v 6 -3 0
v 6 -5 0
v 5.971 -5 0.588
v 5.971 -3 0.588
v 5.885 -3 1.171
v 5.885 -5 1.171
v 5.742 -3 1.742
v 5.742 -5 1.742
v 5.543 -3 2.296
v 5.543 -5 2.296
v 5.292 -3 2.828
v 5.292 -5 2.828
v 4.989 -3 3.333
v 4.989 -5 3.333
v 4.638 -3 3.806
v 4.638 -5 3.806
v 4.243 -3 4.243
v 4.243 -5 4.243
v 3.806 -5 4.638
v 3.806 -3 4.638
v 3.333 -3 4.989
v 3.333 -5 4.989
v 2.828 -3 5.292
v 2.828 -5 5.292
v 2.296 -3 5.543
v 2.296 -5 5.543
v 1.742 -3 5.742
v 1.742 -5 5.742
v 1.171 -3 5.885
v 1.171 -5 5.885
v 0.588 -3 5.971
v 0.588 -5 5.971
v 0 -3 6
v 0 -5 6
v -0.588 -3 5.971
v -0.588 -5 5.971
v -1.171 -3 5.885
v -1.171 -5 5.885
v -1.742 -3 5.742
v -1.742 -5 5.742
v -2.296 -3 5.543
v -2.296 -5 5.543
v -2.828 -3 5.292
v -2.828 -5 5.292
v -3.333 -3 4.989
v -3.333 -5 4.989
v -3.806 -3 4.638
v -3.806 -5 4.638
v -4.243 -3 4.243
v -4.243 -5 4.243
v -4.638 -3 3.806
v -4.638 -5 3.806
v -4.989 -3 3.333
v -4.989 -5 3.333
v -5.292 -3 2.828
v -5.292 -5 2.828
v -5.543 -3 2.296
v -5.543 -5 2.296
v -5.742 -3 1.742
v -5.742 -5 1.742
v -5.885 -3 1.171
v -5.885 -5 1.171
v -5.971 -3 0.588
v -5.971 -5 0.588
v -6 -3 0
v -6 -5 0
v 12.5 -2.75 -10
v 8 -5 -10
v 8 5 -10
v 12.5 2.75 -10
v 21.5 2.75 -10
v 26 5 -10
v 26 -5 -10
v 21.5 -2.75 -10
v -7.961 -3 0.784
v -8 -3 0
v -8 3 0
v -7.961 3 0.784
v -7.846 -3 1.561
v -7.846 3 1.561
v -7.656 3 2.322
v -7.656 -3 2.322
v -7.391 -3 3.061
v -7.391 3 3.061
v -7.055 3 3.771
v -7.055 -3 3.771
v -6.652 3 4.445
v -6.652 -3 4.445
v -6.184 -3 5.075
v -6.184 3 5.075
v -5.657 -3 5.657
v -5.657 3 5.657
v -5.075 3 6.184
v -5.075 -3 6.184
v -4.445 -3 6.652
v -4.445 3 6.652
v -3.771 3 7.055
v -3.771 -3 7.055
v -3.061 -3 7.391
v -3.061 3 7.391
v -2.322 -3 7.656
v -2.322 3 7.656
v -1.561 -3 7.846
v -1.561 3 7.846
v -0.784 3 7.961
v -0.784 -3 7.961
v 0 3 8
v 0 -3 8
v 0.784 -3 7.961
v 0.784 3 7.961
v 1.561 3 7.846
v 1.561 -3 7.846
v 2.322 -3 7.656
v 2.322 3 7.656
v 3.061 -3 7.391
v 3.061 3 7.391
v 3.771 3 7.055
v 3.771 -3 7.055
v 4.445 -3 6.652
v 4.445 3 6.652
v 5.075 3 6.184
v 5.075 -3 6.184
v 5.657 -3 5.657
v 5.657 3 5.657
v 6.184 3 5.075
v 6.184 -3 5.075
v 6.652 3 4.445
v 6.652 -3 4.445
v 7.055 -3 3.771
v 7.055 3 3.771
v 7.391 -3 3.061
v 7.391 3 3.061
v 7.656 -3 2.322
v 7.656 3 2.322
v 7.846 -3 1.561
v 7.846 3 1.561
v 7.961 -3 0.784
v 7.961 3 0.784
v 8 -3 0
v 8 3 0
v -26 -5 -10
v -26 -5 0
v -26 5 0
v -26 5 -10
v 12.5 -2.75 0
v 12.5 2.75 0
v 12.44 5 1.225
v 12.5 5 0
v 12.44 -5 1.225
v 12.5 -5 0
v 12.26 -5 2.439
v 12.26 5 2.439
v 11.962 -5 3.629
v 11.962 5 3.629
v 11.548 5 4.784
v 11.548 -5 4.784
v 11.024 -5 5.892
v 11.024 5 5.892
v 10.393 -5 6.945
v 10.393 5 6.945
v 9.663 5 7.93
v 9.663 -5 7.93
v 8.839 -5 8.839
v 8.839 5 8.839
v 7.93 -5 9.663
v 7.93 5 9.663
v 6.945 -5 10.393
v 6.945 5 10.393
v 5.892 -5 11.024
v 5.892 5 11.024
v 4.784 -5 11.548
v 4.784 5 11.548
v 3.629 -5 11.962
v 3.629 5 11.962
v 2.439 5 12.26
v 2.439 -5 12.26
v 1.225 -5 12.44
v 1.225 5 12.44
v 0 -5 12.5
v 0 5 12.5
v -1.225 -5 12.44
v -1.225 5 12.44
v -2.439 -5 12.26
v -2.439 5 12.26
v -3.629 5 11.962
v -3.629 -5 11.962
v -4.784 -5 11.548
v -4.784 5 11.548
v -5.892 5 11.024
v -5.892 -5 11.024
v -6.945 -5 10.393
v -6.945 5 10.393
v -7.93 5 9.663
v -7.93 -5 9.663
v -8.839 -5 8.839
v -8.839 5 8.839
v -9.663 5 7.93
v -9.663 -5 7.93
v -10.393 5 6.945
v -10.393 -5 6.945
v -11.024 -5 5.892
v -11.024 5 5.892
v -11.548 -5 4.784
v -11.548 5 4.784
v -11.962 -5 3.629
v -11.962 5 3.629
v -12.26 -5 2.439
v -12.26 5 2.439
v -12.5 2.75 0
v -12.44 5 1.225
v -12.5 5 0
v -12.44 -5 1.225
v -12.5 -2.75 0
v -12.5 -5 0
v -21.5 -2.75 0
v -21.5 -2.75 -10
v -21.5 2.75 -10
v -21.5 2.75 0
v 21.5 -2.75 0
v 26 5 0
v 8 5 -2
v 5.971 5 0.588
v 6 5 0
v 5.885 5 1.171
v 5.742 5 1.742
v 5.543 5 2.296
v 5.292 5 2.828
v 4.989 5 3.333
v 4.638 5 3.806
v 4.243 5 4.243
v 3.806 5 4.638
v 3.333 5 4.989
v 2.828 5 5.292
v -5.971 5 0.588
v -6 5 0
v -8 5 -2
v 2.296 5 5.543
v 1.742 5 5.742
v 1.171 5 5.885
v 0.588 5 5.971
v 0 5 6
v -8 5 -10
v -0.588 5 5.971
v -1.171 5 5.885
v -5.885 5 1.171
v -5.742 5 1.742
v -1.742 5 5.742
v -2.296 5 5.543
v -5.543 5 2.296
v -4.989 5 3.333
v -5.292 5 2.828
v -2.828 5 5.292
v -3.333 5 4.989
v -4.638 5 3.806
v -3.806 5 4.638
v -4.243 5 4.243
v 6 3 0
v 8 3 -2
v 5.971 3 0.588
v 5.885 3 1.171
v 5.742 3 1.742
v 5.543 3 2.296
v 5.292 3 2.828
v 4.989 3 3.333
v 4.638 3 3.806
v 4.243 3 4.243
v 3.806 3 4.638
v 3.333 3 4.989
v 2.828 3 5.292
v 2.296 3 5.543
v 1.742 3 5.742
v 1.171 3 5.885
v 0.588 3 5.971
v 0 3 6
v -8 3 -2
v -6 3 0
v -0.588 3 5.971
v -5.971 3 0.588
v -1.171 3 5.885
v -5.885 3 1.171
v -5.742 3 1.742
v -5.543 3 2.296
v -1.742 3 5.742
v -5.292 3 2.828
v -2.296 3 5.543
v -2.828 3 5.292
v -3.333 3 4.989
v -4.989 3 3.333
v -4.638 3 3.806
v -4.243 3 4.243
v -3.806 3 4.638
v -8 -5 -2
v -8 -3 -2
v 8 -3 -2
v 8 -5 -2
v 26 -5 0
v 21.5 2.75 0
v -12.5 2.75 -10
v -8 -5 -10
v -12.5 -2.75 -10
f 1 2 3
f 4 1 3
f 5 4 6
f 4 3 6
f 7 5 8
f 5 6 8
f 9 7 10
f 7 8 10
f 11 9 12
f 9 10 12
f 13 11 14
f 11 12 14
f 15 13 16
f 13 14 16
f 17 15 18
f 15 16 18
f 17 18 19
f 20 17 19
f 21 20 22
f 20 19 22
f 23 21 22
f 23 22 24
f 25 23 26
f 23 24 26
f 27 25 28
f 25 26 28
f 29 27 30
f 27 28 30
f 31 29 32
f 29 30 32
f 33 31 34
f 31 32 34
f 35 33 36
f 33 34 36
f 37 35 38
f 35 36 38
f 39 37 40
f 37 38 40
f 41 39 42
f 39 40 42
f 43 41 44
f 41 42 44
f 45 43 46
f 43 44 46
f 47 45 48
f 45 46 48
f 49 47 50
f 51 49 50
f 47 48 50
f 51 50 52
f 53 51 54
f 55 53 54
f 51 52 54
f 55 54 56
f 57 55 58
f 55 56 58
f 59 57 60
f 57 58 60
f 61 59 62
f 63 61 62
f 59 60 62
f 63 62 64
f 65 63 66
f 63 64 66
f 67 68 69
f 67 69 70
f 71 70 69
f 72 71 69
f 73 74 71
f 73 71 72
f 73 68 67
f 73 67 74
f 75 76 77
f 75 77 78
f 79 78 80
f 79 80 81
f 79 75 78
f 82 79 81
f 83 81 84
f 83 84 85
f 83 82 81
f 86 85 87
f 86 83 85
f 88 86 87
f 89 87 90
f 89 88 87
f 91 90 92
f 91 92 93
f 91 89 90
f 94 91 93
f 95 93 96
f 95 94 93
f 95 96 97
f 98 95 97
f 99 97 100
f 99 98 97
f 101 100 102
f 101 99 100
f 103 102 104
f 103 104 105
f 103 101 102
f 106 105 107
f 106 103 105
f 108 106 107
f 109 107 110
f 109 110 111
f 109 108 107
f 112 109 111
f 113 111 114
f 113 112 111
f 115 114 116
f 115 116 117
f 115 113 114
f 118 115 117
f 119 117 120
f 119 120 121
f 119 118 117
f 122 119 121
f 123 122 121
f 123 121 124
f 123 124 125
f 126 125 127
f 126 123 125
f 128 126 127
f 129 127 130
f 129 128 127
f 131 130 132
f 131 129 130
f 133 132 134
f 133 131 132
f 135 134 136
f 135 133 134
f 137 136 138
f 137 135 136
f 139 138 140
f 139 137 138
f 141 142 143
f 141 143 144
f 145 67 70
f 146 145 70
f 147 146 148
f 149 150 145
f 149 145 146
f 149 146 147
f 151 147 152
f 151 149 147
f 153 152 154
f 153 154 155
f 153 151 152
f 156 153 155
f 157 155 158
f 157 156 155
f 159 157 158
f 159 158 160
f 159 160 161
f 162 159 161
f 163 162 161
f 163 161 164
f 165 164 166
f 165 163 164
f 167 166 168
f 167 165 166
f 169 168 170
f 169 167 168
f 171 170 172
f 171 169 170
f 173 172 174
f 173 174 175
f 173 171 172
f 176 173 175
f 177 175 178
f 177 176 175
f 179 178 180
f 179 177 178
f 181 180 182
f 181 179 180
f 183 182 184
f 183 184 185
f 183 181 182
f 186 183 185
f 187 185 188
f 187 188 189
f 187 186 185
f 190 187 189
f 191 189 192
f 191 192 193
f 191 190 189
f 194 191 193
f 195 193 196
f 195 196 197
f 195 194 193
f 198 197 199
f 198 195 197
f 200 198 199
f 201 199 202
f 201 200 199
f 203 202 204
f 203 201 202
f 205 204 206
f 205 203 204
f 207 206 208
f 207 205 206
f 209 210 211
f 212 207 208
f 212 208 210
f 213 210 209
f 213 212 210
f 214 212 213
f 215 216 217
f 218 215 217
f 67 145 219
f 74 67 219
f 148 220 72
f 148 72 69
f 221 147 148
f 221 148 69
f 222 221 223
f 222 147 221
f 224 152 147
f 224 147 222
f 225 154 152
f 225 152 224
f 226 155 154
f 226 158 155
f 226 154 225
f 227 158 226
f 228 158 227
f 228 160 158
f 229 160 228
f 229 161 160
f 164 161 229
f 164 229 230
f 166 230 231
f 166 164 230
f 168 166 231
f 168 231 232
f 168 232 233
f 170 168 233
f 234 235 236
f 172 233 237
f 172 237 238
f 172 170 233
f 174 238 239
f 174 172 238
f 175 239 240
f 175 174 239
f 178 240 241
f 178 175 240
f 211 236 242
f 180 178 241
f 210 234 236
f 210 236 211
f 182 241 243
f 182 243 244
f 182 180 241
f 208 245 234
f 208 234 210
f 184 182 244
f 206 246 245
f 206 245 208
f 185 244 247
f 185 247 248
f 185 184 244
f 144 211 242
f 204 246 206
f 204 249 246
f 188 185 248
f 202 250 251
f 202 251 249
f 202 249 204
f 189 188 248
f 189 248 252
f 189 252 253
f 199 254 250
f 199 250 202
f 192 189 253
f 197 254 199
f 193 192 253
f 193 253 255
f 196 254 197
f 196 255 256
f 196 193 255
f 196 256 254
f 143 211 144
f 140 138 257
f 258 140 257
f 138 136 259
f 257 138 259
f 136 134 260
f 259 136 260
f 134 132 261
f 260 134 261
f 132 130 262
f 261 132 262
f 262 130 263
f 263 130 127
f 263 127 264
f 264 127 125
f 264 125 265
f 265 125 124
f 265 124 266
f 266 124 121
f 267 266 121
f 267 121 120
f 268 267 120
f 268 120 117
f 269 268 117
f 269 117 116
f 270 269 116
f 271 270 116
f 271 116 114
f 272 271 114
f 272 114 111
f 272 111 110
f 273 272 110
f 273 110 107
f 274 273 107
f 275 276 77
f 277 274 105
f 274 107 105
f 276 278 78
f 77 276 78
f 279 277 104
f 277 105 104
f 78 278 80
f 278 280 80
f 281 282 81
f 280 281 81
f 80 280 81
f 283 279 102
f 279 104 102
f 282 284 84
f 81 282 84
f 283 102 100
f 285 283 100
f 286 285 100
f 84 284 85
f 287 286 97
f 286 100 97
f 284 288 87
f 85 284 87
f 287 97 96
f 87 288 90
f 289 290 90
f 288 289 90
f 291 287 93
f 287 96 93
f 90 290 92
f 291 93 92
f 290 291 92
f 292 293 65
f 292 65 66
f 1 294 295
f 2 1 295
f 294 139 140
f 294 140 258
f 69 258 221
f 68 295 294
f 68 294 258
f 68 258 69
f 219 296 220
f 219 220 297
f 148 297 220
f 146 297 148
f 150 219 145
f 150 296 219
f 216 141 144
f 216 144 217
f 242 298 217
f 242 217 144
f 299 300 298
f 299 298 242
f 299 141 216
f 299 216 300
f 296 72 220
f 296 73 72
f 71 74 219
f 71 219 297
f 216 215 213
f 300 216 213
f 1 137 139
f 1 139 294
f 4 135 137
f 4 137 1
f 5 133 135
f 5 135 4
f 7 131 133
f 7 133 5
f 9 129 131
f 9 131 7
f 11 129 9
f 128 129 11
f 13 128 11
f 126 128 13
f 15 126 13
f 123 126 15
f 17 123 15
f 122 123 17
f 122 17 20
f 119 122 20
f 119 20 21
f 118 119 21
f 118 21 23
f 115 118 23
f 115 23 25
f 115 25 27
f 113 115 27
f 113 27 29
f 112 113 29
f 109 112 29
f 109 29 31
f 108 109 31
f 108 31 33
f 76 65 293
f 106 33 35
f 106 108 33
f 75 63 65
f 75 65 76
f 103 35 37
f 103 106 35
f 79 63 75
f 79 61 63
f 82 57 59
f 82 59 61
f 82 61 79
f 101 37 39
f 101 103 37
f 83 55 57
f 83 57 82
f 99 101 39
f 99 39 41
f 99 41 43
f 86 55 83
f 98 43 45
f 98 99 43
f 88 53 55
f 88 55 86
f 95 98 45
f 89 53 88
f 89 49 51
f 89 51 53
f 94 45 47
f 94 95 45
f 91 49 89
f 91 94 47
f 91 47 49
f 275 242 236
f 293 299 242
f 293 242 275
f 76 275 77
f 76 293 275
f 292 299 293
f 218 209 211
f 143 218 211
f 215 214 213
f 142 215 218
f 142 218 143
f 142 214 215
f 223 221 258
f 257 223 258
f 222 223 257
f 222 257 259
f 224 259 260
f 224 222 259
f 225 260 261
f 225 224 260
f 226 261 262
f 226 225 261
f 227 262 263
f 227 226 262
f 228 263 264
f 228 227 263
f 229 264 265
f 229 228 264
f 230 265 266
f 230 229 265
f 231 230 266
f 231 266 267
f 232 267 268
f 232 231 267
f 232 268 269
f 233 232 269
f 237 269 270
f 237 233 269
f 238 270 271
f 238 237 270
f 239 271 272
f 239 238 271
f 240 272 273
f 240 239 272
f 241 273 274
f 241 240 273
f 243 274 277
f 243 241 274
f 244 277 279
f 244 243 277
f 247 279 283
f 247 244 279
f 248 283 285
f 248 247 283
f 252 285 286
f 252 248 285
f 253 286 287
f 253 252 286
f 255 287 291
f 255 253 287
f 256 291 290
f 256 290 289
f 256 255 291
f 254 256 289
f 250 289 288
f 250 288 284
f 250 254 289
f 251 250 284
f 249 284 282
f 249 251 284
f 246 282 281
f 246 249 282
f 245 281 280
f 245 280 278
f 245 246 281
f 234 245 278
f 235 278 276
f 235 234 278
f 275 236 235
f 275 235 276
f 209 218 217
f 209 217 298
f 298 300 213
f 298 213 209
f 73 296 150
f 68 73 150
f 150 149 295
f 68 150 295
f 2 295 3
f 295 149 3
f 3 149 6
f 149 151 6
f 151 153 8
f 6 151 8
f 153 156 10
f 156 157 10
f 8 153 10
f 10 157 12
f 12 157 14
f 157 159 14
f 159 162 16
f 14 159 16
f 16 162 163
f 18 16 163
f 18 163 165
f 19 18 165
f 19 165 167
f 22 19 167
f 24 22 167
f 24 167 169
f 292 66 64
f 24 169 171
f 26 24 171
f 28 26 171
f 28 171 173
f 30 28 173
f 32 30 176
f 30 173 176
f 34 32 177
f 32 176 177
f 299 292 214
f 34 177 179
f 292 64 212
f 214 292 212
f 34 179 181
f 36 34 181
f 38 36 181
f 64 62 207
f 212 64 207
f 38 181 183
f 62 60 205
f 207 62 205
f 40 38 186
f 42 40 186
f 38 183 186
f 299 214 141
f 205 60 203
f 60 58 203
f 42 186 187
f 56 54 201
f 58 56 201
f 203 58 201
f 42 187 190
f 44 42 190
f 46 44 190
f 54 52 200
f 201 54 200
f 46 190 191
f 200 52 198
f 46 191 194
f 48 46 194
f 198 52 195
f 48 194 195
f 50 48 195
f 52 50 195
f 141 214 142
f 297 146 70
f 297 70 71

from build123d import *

# Parameters (mm, degrees)
F1_DEPTH      = 5
F1_DEPTH_BACK = 5
F3_DEPTH      = 2
F5_W          = 9
F5_H          = 5.5
F6_DEPTH      = 25
F7_SIZE       = 1.99999


# Not quite as in the source:
# - a fillet or chamfer is up to 0.001 mm smaller than in the source, because OpenCascade refuses the exact size


with BuildPart() as f1:
    # F0 (on Front) → F1 (new body, two sides)
    with BuildSketch(Plane.XZ) as f1_sk:
        with BuildLine():
            Line((8, 0), (12.5, 0))
            ThreePointArc((12.5, 0), (0, 12.5), (-12.5, 0))
            Line((-12.5, 0), (-8, 0))
            ThreePointArc((-8, 0), (0, 8), (8, 0))
        make_face()
        Polygon((26, 0), (12.5, 0), (8, 0), (8, -10), (26, -10), align=None)
        Polygon((-8, 0), (-12.5, 0), (-26, 0), (-26, -10), (-8, -10), align=None)
    extrude(amount=F1_DEPTH)
    extrude(f1_sk.sketch, amount=-F1_DEPTH_BACK)

    # F2 (on face) → F3 (join)
    with BuildSketch(Plane(origin=(0, 5, 0), x_dir=(-1, 0, 0), z_dir=(0, 1, 0))):
        with BuildLine():
            Line((6, 0), (8, 0))
            ThreePointArc((8, 0), (0, 8), (-8, 0))
            Line((-8, 0), (-6, 0))
            ThreePointArc((-6, 0), (0, 6), (6, 0))
        make_face()
    extrude(amount=-F3_DEPTH)

    # F4: F1 across plane


with BuildPart() as f1_1:
    add(f1.part)
    add(f1.part.mirror(Plane.XZ))

    # F5 (on face) → F6 (cut)
    with BuildSketch(Plane.XY):
        with Locations((-17, 0)):
            Rectangle(F5_W, F5_H)
        with Locations((17, 0)):
            Rectangle(F5_W, F5_H)
    extrude(amount=-F6_DEPTH, mode=Mode.SUBTRACT)

    # F7 (size 2 in the source; OpenCascade refuses exactly that, so slightly less here)
    f7_edges = [f1_1.edges().sort_by_distance(p)[0] for p in [
        (-8, -4, 0),
        (-8, 0, 0),
        (-8, 4, 0),
        (8, 0, 0),
        (8, -4, 0),
        (8, 4, 0),
    ]]
    chamfer(f7_edges, length=F7_SIZE)


solid = f1_1.part
